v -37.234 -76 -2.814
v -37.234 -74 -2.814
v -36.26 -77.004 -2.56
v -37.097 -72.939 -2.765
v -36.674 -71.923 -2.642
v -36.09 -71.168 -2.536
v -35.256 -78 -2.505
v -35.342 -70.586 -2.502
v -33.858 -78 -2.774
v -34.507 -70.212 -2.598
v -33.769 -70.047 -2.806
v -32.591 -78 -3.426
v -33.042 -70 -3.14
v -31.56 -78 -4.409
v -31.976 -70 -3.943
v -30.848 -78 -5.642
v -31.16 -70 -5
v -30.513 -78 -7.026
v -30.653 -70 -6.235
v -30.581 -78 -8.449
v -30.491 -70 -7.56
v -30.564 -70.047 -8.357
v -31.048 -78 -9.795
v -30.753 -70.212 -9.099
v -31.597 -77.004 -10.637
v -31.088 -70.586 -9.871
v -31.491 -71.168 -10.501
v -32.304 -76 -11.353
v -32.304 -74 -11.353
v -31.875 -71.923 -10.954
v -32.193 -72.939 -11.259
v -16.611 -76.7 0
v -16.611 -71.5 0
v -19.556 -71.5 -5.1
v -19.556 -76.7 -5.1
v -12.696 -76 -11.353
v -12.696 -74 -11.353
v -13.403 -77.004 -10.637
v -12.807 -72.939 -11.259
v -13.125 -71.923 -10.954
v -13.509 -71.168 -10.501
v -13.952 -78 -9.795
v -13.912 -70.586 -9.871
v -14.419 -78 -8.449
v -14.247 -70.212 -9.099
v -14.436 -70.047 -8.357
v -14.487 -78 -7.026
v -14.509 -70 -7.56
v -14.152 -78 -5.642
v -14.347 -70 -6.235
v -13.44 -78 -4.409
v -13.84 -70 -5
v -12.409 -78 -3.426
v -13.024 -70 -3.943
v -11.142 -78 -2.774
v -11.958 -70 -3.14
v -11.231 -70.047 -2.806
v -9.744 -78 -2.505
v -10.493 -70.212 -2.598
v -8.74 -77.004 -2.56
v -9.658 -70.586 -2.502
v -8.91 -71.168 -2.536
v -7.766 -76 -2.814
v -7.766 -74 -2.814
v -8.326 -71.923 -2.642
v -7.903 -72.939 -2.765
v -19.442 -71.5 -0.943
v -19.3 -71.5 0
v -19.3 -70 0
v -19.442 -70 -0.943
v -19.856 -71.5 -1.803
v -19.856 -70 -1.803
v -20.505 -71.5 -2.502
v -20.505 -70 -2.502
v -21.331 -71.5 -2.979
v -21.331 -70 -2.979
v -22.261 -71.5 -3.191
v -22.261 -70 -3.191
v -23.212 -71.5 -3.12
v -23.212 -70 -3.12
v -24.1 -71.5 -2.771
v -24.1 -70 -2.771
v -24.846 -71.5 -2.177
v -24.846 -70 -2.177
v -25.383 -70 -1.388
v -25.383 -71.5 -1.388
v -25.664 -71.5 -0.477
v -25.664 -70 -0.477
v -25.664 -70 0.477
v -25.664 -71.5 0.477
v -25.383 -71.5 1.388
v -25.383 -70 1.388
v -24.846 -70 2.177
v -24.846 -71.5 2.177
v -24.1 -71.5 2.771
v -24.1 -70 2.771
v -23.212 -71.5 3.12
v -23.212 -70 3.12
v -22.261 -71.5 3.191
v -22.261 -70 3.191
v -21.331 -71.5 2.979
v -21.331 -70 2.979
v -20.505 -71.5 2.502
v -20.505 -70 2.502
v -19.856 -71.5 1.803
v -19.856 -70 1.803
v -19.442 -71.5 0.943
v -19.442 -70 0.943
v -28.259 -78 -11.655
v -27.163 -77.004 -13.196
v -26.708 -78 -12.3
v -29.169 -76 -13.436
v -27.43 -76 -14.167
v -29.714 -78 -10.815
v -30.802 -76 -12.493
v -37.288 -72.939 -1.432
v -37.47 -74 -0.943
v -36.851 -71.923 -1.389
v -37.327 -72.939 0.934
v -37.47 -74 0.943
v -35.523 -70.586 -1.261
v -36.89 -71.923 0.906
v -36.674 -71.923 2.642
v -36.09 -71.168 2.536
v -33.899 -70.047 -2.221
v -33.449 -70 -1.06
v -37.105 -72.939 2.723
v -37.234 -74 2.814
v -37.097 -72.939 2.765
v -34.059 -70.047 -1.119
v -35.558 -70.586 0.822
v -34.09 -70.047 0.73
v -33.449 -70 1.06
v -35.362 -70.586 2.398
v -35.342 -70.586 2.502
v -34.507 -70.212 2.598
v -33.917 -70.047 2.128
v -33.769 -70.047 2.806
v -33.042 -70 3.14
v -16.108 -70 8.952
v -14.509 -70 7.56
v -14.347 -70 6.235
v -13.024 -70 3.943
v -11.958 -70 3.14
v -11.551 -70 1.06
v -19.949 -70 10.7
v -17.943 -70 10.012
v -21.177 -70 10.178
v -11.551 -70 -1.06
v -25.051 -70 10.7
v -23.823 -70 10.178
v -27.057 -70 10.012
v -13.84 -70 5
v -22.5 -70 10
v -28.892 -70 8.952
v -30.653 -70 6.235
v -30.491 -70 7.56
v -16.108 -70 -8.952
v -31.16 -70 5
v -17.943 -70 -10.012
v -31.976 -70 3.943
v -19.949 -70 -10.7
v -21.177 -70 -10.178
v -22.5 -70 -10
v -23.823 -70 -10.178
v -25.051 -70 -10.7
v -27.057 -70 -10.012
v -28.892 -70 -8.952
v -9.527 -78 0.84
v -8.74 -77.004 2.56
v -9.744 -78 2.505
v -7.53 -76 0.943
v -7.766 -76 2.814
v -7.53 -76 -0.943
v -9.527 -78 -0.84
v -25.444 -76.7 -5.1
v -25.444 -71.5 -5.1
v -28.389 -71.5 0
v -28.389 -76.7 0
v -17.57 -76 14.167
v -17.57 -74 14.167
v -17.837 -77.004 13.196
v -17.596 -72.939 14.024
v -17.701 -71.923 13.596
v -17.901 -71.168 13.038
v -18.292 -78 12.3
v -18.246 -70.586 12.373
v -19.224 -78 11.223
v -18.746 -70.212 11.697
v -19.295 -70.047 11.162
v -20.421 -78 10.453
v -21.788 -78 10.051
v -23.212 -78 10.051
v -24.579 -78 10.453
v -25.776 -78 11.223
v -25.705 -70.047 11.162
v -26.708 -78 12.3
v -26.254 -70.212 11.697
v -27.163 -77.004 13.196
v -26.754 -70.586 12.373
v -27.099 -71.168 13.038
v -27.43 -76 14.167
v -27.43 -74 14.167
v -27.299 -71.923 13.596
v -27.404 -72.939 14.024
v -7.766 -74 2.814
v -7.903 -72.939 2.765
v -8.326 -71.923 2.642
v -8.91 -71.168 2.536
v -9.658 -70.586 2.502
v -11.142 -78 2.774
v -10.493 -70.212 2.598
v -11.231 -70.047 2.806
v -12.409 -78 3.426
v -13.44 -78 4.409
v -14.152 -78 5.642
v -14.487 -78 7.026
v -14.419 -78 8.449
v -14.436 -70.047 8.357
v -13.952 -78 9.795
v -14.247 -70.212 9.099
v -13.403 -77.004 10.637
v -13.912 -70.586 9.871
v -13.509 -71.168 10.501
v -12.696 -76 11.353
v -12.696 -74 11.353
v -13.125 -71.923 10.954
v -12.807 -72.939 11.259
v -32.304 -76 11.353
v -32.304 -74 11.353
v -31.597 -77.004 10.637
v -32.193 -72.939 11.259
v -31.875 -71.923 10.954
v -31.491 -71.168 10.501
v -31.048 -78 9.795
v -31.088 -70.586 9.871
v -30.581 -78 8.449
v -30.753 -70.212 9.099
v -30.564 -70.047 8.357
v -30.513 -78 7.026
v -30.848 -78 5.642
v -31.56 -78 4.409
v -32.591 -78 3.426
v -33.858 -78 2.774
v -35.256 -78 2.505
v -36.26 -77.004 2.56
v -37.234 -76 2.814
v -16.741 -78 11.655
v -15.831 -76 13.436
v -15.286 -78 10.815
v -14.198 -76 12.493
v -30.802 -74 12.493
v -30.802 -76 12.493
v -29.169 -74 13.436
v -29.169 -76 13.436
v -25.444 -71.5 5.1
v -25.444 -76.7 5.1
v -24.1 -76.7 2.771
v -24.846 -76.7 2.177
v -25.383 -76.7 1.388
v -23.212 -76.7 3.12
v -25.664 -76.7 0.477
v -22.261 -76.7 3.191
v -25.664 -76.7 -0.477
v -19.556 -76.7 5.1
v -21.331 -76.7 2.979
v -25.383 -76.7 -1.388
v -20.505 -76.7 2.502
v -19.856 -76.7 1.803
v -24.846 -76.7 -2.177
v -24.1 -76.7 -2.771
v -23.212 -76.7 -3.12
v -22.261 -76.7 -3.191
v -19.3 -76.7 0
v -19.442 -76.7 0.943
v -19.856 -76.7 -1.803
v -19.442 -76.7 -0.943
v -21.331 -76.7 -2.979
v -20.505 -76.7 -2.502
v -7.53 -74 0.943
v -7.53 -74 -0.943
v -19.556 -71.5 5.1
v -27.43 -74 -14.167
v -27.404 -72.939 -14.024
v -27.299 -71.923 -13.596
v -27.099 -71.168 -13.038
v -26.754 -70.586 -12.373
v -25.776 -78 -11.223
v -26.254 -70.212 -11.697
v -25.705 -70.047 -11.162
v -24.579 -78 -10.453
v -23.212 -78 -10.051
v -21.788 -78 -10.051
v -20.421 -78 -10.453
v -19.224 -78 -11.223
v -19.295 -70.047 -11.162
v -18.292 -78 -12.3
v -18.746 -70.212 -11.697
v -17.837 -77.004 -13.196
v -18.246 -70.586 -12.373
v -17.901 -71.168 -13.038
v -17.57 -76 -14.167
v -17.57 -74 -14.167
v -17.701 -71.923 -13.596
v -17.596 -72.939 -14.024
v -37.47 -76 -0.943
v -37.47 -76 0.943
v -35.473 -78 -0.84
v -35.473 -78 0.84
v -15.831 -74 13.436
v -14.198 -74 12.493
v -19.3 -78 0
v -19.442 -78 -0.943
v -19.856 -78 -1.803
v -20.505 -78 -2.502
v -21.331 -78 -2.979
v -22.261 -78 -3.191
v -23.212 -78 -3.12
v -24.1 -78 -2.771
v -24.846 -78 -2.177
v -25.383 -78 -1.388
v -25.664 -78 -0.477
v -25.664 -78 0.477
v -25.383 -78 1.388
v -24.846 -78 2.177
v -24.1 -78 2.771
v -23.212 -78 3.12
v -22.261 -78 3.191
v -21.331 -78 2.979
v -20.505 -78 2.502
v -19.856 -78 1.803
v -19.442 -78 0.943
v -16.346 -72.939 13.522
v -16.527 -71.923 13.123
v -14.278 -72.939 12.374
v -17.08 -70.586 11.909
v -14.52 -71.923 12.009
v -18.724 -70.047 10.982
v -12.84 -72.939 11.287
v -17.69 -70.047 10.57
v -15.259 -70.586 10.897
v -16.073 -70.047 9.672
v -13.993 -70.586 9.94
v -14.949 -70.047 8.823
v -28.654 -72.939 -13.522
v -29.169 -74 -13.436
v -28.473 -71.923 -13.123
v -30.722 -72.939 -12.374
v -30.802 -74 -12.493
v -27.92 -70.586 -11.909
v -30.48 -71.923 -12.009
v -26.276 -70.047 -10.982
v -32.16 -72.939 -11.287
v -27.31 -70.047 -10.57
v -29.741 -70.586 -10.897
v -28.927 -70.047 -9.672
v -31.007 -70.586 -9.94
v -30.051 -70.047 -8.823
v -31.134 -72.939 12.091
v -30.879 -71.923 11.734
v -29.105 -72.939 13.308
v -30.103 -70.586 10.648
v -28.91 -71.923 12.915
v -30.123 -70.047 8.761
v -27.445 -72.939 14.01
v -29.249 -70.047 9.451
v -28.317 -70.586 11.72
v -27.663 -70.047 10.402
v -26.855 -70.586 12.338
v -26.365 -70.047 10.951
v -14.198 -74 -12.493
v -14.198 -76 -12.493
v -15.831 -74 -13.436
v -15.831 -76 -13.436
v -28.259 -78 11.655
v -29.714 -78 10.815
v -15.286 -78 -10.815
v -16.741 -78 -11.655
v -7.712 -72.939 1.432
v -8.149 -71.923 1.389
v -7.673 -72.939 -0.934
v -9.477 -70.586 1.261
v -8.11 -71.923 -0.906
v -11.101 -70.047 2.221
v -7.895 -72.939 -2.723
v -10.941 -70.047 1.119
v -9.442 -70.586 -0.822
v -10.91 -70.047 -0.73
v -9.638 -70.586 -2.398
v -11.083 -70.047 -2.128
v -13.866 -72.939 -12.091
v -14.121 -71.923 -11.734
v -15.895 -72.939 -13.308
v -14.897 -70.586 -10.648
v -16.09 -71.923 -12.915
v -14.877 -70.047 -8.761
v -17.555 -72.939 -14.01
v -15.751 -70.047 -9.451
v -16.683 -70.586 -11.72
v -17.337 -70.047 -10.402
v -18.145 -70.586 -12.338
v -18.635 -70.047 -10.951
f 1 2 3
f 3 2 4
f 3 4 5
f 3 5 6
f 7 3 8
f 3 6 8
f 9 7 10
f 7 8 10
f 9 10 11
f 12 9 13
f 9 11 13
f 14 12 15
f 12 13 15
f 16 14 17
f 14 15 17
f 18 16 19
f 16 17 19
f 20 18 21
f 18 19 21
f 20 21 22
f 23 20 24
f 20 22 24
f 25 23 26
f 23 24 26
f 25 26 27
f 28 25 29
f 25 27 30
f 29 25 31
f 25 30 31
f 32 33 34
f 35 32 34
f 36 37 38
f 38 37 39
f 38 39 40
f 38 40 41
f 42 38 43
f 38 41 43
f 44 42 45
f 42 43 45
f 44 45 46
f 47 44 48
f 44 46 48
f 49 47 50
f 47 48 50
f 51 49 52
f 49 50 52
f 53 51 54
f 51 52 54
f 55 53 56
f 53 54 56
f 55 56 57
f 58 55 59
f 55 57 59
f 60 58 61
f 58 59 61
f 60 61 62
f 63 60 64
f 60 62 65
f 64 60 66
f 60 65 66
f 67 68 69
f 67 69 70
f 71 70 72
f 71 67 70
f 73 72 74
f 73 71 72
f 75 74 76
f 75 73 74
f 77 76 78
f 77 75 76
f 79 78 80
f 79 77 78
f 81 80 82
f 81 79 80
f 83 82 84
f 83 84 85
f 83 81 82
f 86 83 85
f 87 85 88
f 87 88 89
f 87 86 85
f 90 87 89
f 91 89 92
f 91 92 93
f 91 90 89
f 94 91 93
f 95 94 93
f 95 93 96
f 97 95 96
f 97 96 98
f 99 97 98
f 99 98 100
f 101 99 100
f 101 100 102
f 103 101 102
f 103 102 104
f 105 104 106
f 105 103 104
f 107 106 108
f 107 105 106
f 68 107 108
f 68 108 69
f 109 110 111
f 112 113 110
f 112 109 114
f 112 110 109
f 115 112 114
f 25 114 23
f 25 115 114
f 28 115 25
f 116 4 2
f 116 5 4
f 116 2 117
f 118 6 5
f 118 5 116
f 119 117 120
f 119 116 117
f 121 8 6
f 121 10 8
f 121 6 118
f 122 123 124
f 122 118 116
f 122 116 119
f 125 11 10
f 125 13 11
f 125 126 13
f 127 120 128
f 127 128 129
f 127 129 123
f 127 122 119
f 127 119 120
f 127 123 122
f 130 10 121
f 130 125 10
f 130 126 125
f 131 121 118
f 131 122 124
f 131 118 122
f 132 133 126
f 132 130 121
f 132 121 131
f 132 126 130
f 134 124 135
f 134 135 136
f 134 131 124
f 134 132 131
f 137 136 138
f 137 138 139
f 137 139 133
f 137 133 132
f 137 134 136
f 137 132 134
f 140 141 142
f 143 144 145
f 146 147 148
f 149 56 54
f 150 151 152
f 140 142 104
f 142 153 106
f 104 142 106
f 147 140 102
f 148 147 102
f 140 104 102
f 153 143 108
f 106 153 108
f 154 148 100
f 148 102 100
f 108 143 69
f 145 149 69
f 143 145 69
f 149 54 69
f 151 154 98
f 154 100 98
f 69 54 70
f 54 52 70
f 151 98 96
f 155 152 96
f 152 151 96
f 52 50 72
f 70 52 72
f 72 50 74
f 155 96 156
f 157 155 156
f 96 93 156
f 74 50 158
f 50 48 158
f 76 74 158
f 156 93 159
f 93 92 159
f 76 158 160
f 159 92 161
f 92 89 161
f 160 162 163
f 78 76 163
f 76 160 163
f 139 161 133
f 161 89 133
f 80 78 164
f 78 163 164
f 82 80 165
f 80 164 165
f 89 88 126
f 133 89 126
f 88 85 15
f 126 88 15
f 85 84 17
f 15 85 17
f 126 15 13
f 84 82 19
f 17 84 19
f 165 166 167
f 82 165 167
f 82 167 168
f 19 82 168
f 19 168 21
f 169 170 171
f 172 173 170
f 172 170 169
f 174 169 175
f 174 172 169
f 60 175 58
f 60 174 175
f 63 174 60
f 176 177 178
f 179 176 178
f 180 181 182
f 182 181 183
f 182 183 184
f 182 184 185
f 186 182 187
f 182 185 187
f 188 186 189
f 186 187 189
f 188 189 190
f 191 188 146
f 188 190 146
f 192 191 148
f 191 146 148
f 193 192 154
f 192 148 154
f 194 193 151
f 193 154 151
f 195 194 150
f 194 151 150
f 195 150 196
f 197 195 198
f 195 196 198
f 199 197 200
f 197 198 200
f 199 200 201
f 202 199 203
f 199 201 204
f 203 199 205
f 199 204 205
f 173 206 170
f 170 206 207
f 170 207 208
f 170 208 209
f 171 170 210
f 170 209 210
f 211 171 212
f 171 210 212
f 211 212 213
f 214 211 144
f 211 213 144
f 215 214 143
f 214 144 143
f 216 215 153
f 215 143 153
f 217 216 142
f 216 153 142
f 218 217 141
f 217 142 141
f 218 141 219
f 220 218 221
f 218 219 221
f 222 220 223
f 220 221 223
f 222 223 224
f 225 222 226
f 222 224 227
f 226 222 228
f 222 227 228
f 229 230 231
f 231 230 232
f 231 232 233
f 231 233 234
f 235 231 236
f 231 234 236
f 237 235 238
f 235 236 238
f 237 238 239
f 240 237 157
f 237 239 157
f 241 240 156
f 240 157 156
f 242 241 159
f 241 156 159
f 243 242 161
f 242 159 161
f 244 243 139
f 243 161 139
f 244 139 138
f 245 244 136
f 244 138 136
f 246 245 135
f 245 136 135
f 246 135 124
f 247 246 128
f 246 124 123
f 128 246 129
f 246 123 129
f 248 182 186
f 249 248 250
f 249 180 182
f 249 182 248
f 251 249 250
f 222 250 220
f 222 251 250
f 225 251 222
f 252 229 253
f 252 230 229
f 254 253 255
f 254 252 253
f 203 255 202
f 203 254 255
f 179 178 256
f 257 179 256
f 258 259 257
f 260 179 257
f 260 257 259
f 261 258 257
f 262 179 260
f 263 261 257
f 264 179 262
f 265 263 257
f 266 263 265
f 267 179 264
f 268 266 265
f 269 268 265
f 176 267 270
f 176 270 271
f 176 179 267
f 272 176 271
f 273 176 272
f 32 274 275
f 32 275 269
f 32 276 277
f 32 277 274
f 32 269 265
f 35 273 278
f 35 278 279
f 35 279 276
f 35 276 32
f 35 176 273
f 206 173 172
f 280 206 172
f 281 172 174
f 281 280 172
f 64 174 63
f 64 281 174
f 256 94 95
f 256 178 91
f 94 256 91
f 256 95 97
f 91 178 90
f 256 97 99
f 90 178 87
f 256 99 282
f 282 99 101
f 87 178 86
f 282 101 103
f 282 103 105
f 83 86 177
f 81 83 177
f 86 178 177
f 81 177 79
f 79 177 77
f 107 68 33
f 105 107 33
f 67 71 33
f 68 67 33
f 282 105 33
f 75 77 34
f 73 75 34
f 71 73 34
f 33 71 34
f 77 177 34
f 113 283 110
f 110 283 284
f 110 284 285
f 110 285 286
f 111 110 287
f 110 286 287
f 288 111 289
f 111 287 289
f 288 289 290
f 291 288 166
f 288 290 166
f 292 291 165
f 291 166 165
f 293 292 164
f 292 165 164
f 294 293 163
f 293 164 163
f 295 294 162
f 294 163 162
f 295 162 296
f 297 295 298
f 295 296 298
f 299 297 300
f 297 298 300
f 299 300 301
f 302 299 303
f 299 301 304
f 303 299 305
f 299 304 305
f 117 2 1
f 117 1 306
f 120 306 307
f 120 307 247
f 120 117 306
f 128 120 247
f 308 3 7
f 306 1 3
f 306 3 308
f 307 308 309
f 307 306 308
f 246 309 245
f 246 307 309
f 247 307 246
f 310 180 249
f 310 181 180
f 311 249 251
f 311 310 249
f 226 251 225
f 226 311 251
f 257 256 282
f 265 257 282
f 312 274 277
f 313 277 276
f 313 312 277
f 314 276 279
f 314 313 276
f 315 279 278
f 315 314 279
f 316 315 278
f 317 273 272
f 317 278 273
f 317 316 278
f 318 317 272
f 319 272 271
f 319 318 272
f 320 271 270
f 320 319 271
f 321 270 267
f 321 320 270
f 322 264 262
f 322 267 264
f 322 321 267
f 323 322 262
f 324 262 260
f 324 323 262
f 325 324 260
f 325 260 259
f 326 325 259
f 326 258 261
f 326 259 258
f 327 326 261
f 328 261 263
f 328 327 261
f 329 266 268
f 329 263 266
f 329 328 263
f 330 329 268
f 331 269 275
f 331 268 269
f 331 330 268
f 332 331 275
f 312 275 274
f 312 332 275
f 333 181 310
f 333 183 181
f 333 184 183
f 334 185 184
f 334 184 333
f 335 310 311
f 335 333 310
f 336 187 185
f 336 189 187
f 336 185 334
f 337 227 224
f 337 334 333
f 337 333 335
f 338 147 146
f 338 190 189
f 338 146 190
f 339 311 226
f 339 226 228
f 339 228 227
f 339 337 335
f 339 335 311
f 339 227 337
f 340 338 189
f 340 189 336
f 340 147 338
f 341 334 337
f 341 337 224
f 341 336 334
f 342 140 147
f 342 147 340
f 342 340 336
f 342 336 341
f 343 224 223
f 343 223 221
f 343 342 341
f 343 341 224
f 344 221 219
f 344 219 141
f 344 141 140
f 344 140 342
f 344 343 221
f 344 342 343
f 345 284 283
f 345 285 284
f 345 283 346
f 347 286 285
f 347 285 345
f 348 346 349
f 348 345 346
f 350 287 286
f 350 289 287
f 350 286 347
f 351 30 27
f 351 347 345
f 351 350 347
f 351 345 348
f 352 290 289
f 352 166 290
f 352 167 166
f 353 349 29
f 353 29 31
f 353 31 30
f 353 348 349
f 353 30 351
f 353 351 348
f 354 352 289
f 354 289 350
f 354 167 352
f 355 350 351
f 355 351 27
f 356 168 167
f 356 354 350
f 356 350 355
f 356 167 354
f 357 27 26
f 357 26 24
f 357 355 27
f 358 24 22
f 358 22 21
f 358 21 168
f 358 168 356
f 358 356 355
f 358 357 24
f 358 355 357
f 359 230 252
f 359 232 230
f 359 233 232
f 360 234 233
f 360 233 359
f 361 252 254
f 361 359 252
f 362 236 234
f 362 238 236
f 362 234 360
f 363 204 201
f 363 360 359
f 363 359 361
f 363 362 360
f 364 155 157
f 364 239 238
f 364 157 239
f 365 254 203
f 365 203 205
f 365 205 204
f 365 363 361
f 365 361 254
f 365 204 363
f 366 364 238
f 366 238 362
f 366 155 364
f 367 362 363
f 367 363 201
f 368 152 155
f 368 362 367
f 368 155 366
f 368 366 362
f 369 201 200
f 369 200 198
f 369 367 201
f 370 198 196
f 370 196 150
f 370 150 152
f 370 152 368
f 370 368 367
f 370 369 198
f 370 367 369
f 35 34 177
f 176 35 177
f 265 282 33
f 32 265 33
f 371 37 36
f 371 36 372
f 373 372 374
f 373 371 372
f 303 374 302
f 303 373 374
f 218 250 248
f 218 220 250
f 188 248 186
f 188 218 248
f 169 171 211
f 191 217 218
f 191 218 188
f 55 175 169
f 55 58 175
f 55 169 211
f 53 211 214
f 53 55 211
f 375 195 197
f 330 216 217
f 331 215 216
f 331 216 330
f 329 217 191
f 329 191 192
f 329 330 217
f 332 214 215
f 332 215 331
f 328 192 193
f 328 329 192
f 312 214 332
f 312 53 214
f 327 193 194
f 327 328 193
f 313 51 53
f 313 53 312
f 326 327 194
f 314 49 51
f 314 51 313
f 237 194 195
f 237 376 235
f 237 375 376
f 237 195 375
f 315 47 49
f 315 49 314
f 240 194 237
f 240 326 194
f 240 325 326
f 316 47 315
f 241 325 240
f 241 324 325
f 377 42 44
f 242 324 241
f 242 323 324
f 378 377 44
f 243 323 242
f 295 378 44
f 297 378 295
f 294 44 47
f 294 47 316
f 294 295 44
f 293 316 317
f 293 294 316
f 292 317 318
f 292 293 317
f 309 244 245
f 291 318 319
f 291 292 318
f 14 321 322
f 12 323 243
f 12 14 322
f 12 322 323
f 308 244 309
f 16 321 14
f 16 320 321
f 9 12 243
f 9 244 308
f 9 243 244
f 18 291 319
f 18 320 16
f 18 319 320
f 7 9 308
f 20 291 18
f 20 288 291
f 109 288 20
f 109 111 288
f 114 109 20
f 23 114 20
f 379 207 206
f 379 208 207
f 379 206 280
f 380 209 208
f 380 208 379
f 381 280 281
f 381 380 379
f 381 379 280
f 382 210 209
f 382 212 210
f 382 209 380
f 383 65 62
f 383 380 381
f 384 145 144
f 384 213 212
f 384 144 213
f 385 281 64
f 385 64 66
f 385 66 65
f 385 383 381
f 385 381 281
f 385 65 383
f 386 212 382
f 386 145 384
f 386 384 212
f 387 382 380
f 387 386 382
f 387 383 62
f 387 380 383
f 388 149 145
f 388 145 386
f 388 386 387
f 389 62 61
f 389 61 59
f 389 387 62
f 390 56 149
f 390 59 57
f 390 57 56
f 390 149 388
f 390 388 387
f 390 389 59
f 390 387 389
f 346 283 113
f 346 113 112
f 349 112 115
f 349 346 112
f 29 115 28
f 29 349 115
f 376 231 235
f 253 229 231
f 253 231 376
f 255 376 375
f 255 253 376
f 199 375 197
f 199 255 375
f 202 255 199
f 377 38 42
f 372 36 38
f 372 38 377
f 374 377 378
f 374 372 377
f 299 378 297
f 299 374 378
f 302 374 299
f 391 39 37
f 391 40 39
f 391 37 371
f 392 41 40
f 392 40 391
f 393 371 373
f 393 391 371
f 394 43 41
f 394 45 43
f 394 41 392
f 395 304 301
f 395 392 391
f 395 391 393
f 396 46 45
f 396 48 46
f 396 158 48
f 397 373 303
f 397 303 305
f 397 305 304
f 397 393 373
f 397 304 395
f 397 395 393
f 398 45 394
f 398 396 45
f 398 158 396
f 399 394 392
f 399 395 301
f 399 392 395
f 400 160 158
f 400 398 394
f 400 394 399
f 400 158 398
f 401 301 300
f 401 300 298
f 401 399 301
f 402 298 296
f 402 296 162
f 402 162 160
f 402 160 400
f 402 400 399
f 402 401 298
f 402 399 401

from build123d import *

# Parameters (mm, degrees)
SKETCH016_R             = 5
POCKET002_DEPTH         = 8.001
POCKET003_DEPTH         = 5.2
BODY011_PLACEMENT_ANGLE = 270


with BuildPart() as part:
    # Sketch014 → Revolution (revolve)
    with BuildSketch(Plane.XZ):
        with BuildLine():
            ThreePointArc((15, -4), (13.828427, -1.171573), (11, 0))
            Line((3.2, 0), (11, 0))
            Line((3.2, 0), (3.2, -8))
            Line((3.2, -8), (13, -8))
            Line((13, -8), (15, -6))
            Line((15, -6), (15, -4))
        make_face()
    revolve(axis=Axis((0, 0, 0), (0, 0, 1)))

    # Sketch016 → Pocket002 (cut, through all)
    with BuildSketch(Plane.XY):
        with Locations((0, 15)):
            Circle(SKETCH016_R)
        with Locations((12.990381, 7.5)):
            Circle(SKETCH016_R)
        with Locations((12.990381, -7.5)):
            Circle(SKETCH016_R)
        with Locations((0, -15)):
            Circle(SKETCH016_R)
        with Locations((-12.990381, -7.5)):
            Circle(SKETCH016_R)
        with Locations((-12.990381, 7.5)):
            Circle(SKETCH016_R)
    extrude(amount=-POCKET002_DEPTH, mode=Mode.SUBTRACT)

    # Sketch015 → Pocket003 (cut)
    with BuildSketch(Plane.XY.offset(-1.5)):
        Polygon((5.888973, 0), (2.944486, 5.1), (-2.944486, 5.1), (-5.888973, 0), (-2.944486, -5.1), (2.944486, -5.1), align=None)
    extrude(amount=-POCKET003_DEPTH, mode=Mode.SUBTRACT)


with BuildPart() as part_1:
    # Body011 placement: moved
    add(part.part.moved(Location((22.5, -70, 0))).rotate(Axis((22.5, -70, 0), (1, 0, 0)), BODY011_PLACEMENT_ANGLE))


with BuildPart() as part_2:
    # Clone006 placement: moved
    add(part_1.part.moved(Location((-45, 0, 0))))


solid = part_2.part
